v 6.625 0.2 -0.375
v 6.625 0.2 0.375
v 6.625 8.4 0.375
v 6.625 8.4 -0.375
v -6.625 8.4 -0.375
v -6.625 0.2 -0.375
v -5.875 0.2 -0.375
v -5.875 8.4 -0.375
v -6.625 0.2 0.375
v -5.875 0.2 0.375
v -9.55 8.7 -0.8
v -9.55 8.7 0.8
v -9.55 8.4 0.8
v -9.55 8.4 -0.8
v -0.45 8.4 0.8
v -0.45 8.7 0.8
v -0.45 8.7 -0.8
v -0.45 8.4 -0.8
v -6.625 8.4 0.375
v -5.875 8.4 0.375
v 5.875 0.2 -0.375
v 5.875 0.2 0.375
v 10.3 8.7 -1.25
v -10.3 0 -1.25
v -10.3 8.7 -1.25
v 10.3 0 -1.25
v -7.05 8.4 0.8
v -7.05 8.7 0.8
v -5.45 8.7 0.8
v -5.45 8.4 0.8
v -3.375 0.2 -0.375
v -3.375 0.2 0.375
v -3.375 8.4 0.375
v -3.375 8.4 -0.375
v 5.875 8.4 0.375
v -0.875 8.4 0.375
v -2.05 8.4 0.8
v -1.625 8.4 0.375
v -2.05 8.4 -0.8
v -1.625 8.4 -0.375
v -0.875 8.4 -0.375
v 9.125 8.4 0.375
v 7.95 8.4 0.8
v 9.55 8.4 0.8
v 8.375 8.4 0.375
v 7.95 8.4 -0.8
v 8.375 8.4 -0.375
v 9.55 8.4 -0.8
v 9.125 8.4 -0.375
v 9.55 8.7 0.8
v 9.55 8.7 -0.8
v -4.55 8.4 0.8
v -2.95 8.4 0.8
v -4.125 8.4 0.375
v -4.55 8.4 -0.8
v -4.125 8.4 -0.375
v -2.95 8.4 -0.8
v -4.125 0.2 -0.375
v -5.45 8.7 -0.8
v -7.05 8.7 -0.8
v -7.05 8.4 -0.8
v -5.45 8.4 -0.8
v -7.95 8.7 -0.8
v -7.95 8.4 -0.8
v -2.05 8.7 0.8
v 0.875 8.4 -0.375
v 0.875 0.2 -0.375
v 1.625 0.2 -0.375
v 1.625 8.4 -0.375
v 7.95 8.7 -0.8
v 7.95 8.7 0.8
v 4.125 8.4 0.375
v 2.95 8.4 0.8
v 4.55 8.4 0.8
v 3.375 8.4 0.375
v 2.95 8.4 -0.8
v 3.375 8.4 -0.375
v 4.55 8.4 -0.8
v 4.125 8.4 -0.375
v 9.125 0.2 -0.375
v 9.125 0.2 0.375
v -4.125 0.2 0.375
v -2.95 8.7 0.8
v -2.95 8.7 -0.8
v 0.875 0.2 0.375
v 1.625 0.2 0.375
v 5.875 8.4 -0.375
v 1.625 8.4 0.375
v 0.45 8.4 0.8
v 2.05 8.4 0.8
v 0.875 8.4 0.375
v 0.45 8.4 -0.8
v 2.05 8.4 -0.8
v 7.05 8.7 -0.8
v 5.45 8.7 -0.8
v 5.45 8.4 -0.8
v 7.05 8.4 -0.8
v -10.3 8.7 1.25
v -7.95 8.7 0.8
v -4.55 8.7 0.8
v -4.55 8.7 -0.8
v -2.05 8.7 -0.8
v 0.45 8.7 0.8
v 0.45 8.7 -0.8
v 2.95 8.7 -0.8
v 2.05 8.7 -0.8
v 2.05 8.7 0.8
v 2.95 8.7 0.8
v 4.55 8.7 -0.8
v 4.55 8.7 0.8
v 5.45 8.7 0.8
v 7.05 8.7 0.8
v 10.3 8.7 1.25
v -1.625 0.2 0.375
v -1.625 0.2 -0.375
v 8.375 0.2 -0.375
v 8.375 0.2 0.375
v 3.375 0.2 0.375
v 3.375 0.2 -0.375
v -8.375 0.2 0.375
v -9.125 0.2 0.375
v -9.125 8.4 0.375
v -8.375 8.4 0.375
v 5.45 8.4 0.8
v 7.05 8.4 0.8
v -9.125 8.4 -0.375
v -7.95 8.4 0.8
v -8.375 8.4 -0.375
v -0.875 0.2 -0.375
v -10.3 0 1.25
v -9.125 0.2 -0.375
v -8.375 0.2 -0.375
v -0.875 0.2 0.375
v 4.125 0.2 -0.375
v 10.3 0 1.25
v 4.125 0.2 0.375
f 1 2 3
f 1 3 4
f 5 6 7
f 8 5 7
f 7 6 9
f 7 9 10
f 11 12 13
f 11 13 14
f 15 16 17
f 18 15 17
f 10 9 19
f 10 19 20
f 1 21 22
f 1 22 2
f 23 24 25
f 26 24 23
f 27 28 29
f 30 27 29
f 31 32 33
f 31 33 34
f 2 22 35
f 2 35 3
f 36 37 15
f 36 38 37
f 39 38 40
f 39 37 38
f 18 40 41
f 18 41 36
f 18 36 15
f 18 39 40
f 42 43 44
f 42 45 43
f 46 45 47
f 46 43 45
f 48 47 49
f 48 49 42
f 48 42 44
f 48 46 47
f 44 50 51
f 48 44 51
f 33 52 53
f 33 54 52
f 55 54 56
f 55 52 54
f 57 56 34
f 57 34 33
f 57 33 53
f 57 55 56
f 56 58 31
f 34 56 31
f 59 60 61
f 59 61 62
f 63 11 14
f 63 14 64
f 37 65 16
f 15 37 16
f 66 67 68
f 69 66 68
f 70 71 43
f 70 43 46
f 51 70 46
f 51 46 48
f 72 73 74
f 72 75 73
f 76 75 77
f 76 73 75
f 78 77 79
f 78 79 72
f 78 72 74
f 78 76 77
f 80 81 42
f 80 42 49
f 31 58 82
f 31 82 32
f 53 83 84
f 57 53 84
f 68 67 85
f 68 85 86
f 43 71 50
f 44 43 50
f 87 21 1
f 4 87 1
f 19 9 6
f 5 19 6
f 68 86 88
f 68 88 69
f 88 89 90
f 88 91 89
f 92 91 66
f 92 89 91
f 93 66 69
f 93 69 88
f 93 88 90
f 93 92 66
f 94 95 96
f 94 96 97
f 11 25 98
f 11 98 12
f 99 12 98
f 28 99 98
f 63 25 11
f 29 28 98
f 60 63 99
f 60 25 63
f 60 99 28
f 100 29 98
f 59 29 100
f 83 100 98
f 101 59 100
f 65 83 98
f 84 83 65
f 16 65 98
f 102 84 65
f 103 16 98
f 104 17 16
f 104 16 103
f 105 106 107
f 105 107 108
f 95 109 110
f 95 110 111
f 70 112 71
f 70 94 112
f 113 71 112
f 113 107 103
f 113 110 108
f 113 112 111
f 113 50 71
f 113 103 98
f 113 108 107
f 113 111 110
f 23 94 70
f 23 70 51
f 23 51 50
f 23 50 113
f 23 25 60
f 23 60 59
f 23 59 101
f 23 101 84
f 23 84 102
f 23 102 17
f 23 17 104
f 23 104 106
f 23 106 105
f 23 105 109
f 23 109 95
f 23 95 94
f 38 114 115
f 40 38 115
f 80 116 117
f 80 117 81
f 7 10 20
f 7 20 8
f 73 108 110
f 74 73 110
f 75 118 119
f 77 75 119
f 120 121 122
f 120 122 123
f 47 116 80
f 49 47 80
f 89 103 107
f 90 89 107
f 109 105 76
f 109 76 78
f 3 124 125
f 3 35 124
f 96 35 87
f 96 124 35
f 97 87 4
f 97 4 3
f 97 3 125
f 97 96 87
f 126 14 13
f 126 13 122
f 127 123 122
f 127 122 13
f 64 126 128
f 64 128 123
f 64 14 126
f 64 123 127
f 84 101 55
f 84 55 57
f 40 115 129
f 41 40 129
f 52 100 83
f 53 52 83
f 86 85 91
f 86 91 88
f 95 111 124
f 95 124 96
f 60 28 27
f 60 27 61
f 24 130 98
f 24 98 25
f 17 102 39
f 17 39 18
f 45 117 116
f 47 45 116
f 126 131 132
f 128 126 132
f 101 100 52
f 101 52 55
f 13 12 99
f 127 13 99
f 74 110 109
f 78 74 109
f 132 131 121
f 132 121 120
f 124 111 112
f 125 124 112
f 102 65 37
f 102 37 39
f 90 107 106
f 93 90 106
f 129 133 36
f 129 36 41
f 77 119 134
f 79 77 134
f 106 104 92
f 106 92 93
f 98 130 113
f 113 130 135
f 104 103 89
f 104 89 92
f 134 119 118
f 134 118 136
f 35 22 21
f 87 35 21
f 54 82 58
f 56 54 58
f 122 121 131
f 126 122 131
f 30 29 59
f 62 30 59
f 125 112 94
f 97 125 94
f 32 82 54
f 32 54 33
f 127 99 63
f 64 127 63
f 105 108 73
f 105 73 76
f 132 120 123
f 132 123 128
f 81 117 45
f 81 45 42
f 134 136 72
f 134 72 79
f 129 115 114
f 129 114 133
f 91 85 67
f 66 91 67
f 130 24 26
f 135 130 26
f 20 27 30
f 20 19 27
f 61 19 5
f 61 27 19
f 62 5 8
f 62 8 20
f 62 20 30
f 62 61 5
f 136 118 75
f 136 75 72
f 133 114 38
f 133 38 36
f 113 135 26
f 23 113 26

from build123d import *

# Parameters (mm, degrees)
CROQUIS1_W              = 20.6
CROQUIS1_H              = 2.5
SALIENTE_EXTRUIR1_DEPTH = 8.7
CROQUIS3_W              = 1.6
CROQUIS3_H              = 1.6
CORTAR_EXTRUIR1_DEPTH   = 8.5
CROQUIS5_W              = 1.6
CROQUIS5_H              = 1.6
CROQUIS5_W_2            = 0.75
CROQUIS5_H_2            = 0.75
SALIENTE_EXTRUIR2_DEPTH = 8.2


with BuildPart() as part:
    # Croquis1 → Saliente-Extruir1 (new body)
    with BuildSketch(Plane(origin=(0, 0, 0), x_dir=(1, 0, 0), z_dir=(0, 1, 0))):
        Rectangle(CROQUIS1_W, CROQUIS1_H)
    extrude(amount=SALIENTE_EXTRUIR1_DEPTH)

    # Croquis3 → Cortar-Extruir1 (cut)
    with BuildSketch(Plane(origin=(0, 8.7, 0), x_dir=(1, 0, 0), z_dir=(0, 1, 0))):
        with Locations((-8.75, 0)):
            Rectangle(CROQUIS3_W, CROQUIS3_H)
        with Locations((-6.25, 0)):
            Rectangle(CROQUIS3_W, CROQUIS3_H)
        with Locations((-3.75, 0)):
            Rectangle(CROQUIS3_W, CROQUIS3_H)
        with Locations((-1.25, 0)):
            Rectangle(CROQUIS3_W, CROQUIS3_H)
        with Locations((1.25, 0)):
            Rectangle(CROQUIS3_W, CROQUIS3_H)
        with Locations((3.75, 0)):
            Rectangle(CROQUIS3_W, CROQUIS3_H)
        with Locations((6.25, 0)):
            Rectangle(CROQUIS3_W, CROQUIS3_H)
        with Locations((8.75, 0)):
            Rectangle(CROQUIS3_W, CROQUIS3_H)
    extrude(amount=-CORTAR_EXTRUIR1_DEPTH, mode=Mode.SUBTRACT)

    # Croquis5 → Saliente-Extruir2 (add)
    # profile 1 of 8: a face of its own
    with BuildSketch(Plane(origin=(0, 0.2, 0), x_dir=(1, 0, 0), z_dir=(0, 1, 0))):
        with Locations((-8.75, 0)):
            Rectangle(CROQUIS5_W, CROQUIS5_H)
        with Locations((-8.75, 0)):
            Rectangle(CROQUIS5_W_2, CROQUIS5_H_2, mode=Mode.SUBTRACT)
    # profile 2 of 8: a face of its own
    with BuildSketch(Plane(origin=(0, 0.2, 0), x_dir=(1, 0, 0), z_dir=(0, 1, 0))):
        with Locations((-6.25, 0)):
            Rectangle(CROQUIS5_W, CROQUIS5_H)
        with Locations((-6.25, 0)):
            Rectangle(CROQUIS5_W_2, CROQUIS5_H_2, mode=Mode.SUBTRACT)
    # profile 3 of 8: a face of its own
    with BuildSketch(Plane(origin=(0, 0.2, 0), x_dir=(1, 0, 0), z_dir=(0, 1, 0))):
        with Locations((-3.75, 0)):
            Rectangle(CROQUIS5_W, CROQUIS5_H)
        with Locations((-3.75, 0)):
            Rectangle(CROQUIS5_W_2, CROQUIS5_H_2, mode=Mode.SUBTRACT)
    # profile 4 of 8: a face of its own
    with BuildSketch(Plane(origin=(0, 0.2, 0), x_dir=(1, 0, 0), z_dir=(0, 1, 0))):
        with Locations((-1.25, 0)):
            Rectangle(CROQUIS5_W, CROQUIS5_H)
        with Locations((-1.25, 0)):
            Rectangle(CROQUIS5_W_2, CROQUIS5_H_2, mode=Mode.SUBTRACT)
    # profile 5 of 8: a face of its own
    with BuildSketch(Plane(origin=(0, 0.2, 0), x_dir=(1, 0, 0), z_dir=(0, 1, 0))):
        with Locations((1.25, 0)):
            Rectangle(CROQUIS5_W, CROQUIS5_H)
        with Locations((1.25, 0)):
            Rectangle(CROQUIS5_W_2, CROQUIS5_H_2, mode=Mode.SUBTRACT)
    # profile 6 of 8: a face of its own
    with BuildSketch(Plane(origin=(0, 0.2, 0), x_dir=(1, 0, 0), z_dir=(0, 1, 0))):
        with Locations((3.75, 0)):
            Rectangle(CROQUIS5_W, CROQUIS5_H)
        with Locations((3.75, 0)):
            Rectangle(CROQUIS5_W_2, CROQUIS5_H_2, mode=Mode.SUBTRACT)
    # profile 7 of 8: a face of its own
    with BuildSketch(Plane(origin=(0, 0.2, 0), x_dir=(1, 0, 0), z_dir=(0, 1, 0))):
        with Locations((6.25, 0)):
            Rectangle(CROQUIS5_W, CROQUIS5_H)
        with Locations((6.25, 0)):
            Rectangle(CROQUIS5_W_2, CROQUIS5_H_2, mode=Mode.SUBTRACT)
    # profile 8 of 8: a face of its own
    with BuildSketch(Plane(origin=(0, 0.2, 0), x_dir=(1, 0, 0), z_dir=(0, 1, 0))):
        with Locations((8.75, 0)):
            Rectangle(CROQUIS5_W, CROQUIS5_H)
        with Locations((8.75, 0)):
            Rectangle(CROQUIS5_W_2, CROQUIS5_H_2, mode=Mode.SUBTRACT)
    extrude(amount=SALIENTE_EXTRUIR2_DEPTH)


solid = part.part
